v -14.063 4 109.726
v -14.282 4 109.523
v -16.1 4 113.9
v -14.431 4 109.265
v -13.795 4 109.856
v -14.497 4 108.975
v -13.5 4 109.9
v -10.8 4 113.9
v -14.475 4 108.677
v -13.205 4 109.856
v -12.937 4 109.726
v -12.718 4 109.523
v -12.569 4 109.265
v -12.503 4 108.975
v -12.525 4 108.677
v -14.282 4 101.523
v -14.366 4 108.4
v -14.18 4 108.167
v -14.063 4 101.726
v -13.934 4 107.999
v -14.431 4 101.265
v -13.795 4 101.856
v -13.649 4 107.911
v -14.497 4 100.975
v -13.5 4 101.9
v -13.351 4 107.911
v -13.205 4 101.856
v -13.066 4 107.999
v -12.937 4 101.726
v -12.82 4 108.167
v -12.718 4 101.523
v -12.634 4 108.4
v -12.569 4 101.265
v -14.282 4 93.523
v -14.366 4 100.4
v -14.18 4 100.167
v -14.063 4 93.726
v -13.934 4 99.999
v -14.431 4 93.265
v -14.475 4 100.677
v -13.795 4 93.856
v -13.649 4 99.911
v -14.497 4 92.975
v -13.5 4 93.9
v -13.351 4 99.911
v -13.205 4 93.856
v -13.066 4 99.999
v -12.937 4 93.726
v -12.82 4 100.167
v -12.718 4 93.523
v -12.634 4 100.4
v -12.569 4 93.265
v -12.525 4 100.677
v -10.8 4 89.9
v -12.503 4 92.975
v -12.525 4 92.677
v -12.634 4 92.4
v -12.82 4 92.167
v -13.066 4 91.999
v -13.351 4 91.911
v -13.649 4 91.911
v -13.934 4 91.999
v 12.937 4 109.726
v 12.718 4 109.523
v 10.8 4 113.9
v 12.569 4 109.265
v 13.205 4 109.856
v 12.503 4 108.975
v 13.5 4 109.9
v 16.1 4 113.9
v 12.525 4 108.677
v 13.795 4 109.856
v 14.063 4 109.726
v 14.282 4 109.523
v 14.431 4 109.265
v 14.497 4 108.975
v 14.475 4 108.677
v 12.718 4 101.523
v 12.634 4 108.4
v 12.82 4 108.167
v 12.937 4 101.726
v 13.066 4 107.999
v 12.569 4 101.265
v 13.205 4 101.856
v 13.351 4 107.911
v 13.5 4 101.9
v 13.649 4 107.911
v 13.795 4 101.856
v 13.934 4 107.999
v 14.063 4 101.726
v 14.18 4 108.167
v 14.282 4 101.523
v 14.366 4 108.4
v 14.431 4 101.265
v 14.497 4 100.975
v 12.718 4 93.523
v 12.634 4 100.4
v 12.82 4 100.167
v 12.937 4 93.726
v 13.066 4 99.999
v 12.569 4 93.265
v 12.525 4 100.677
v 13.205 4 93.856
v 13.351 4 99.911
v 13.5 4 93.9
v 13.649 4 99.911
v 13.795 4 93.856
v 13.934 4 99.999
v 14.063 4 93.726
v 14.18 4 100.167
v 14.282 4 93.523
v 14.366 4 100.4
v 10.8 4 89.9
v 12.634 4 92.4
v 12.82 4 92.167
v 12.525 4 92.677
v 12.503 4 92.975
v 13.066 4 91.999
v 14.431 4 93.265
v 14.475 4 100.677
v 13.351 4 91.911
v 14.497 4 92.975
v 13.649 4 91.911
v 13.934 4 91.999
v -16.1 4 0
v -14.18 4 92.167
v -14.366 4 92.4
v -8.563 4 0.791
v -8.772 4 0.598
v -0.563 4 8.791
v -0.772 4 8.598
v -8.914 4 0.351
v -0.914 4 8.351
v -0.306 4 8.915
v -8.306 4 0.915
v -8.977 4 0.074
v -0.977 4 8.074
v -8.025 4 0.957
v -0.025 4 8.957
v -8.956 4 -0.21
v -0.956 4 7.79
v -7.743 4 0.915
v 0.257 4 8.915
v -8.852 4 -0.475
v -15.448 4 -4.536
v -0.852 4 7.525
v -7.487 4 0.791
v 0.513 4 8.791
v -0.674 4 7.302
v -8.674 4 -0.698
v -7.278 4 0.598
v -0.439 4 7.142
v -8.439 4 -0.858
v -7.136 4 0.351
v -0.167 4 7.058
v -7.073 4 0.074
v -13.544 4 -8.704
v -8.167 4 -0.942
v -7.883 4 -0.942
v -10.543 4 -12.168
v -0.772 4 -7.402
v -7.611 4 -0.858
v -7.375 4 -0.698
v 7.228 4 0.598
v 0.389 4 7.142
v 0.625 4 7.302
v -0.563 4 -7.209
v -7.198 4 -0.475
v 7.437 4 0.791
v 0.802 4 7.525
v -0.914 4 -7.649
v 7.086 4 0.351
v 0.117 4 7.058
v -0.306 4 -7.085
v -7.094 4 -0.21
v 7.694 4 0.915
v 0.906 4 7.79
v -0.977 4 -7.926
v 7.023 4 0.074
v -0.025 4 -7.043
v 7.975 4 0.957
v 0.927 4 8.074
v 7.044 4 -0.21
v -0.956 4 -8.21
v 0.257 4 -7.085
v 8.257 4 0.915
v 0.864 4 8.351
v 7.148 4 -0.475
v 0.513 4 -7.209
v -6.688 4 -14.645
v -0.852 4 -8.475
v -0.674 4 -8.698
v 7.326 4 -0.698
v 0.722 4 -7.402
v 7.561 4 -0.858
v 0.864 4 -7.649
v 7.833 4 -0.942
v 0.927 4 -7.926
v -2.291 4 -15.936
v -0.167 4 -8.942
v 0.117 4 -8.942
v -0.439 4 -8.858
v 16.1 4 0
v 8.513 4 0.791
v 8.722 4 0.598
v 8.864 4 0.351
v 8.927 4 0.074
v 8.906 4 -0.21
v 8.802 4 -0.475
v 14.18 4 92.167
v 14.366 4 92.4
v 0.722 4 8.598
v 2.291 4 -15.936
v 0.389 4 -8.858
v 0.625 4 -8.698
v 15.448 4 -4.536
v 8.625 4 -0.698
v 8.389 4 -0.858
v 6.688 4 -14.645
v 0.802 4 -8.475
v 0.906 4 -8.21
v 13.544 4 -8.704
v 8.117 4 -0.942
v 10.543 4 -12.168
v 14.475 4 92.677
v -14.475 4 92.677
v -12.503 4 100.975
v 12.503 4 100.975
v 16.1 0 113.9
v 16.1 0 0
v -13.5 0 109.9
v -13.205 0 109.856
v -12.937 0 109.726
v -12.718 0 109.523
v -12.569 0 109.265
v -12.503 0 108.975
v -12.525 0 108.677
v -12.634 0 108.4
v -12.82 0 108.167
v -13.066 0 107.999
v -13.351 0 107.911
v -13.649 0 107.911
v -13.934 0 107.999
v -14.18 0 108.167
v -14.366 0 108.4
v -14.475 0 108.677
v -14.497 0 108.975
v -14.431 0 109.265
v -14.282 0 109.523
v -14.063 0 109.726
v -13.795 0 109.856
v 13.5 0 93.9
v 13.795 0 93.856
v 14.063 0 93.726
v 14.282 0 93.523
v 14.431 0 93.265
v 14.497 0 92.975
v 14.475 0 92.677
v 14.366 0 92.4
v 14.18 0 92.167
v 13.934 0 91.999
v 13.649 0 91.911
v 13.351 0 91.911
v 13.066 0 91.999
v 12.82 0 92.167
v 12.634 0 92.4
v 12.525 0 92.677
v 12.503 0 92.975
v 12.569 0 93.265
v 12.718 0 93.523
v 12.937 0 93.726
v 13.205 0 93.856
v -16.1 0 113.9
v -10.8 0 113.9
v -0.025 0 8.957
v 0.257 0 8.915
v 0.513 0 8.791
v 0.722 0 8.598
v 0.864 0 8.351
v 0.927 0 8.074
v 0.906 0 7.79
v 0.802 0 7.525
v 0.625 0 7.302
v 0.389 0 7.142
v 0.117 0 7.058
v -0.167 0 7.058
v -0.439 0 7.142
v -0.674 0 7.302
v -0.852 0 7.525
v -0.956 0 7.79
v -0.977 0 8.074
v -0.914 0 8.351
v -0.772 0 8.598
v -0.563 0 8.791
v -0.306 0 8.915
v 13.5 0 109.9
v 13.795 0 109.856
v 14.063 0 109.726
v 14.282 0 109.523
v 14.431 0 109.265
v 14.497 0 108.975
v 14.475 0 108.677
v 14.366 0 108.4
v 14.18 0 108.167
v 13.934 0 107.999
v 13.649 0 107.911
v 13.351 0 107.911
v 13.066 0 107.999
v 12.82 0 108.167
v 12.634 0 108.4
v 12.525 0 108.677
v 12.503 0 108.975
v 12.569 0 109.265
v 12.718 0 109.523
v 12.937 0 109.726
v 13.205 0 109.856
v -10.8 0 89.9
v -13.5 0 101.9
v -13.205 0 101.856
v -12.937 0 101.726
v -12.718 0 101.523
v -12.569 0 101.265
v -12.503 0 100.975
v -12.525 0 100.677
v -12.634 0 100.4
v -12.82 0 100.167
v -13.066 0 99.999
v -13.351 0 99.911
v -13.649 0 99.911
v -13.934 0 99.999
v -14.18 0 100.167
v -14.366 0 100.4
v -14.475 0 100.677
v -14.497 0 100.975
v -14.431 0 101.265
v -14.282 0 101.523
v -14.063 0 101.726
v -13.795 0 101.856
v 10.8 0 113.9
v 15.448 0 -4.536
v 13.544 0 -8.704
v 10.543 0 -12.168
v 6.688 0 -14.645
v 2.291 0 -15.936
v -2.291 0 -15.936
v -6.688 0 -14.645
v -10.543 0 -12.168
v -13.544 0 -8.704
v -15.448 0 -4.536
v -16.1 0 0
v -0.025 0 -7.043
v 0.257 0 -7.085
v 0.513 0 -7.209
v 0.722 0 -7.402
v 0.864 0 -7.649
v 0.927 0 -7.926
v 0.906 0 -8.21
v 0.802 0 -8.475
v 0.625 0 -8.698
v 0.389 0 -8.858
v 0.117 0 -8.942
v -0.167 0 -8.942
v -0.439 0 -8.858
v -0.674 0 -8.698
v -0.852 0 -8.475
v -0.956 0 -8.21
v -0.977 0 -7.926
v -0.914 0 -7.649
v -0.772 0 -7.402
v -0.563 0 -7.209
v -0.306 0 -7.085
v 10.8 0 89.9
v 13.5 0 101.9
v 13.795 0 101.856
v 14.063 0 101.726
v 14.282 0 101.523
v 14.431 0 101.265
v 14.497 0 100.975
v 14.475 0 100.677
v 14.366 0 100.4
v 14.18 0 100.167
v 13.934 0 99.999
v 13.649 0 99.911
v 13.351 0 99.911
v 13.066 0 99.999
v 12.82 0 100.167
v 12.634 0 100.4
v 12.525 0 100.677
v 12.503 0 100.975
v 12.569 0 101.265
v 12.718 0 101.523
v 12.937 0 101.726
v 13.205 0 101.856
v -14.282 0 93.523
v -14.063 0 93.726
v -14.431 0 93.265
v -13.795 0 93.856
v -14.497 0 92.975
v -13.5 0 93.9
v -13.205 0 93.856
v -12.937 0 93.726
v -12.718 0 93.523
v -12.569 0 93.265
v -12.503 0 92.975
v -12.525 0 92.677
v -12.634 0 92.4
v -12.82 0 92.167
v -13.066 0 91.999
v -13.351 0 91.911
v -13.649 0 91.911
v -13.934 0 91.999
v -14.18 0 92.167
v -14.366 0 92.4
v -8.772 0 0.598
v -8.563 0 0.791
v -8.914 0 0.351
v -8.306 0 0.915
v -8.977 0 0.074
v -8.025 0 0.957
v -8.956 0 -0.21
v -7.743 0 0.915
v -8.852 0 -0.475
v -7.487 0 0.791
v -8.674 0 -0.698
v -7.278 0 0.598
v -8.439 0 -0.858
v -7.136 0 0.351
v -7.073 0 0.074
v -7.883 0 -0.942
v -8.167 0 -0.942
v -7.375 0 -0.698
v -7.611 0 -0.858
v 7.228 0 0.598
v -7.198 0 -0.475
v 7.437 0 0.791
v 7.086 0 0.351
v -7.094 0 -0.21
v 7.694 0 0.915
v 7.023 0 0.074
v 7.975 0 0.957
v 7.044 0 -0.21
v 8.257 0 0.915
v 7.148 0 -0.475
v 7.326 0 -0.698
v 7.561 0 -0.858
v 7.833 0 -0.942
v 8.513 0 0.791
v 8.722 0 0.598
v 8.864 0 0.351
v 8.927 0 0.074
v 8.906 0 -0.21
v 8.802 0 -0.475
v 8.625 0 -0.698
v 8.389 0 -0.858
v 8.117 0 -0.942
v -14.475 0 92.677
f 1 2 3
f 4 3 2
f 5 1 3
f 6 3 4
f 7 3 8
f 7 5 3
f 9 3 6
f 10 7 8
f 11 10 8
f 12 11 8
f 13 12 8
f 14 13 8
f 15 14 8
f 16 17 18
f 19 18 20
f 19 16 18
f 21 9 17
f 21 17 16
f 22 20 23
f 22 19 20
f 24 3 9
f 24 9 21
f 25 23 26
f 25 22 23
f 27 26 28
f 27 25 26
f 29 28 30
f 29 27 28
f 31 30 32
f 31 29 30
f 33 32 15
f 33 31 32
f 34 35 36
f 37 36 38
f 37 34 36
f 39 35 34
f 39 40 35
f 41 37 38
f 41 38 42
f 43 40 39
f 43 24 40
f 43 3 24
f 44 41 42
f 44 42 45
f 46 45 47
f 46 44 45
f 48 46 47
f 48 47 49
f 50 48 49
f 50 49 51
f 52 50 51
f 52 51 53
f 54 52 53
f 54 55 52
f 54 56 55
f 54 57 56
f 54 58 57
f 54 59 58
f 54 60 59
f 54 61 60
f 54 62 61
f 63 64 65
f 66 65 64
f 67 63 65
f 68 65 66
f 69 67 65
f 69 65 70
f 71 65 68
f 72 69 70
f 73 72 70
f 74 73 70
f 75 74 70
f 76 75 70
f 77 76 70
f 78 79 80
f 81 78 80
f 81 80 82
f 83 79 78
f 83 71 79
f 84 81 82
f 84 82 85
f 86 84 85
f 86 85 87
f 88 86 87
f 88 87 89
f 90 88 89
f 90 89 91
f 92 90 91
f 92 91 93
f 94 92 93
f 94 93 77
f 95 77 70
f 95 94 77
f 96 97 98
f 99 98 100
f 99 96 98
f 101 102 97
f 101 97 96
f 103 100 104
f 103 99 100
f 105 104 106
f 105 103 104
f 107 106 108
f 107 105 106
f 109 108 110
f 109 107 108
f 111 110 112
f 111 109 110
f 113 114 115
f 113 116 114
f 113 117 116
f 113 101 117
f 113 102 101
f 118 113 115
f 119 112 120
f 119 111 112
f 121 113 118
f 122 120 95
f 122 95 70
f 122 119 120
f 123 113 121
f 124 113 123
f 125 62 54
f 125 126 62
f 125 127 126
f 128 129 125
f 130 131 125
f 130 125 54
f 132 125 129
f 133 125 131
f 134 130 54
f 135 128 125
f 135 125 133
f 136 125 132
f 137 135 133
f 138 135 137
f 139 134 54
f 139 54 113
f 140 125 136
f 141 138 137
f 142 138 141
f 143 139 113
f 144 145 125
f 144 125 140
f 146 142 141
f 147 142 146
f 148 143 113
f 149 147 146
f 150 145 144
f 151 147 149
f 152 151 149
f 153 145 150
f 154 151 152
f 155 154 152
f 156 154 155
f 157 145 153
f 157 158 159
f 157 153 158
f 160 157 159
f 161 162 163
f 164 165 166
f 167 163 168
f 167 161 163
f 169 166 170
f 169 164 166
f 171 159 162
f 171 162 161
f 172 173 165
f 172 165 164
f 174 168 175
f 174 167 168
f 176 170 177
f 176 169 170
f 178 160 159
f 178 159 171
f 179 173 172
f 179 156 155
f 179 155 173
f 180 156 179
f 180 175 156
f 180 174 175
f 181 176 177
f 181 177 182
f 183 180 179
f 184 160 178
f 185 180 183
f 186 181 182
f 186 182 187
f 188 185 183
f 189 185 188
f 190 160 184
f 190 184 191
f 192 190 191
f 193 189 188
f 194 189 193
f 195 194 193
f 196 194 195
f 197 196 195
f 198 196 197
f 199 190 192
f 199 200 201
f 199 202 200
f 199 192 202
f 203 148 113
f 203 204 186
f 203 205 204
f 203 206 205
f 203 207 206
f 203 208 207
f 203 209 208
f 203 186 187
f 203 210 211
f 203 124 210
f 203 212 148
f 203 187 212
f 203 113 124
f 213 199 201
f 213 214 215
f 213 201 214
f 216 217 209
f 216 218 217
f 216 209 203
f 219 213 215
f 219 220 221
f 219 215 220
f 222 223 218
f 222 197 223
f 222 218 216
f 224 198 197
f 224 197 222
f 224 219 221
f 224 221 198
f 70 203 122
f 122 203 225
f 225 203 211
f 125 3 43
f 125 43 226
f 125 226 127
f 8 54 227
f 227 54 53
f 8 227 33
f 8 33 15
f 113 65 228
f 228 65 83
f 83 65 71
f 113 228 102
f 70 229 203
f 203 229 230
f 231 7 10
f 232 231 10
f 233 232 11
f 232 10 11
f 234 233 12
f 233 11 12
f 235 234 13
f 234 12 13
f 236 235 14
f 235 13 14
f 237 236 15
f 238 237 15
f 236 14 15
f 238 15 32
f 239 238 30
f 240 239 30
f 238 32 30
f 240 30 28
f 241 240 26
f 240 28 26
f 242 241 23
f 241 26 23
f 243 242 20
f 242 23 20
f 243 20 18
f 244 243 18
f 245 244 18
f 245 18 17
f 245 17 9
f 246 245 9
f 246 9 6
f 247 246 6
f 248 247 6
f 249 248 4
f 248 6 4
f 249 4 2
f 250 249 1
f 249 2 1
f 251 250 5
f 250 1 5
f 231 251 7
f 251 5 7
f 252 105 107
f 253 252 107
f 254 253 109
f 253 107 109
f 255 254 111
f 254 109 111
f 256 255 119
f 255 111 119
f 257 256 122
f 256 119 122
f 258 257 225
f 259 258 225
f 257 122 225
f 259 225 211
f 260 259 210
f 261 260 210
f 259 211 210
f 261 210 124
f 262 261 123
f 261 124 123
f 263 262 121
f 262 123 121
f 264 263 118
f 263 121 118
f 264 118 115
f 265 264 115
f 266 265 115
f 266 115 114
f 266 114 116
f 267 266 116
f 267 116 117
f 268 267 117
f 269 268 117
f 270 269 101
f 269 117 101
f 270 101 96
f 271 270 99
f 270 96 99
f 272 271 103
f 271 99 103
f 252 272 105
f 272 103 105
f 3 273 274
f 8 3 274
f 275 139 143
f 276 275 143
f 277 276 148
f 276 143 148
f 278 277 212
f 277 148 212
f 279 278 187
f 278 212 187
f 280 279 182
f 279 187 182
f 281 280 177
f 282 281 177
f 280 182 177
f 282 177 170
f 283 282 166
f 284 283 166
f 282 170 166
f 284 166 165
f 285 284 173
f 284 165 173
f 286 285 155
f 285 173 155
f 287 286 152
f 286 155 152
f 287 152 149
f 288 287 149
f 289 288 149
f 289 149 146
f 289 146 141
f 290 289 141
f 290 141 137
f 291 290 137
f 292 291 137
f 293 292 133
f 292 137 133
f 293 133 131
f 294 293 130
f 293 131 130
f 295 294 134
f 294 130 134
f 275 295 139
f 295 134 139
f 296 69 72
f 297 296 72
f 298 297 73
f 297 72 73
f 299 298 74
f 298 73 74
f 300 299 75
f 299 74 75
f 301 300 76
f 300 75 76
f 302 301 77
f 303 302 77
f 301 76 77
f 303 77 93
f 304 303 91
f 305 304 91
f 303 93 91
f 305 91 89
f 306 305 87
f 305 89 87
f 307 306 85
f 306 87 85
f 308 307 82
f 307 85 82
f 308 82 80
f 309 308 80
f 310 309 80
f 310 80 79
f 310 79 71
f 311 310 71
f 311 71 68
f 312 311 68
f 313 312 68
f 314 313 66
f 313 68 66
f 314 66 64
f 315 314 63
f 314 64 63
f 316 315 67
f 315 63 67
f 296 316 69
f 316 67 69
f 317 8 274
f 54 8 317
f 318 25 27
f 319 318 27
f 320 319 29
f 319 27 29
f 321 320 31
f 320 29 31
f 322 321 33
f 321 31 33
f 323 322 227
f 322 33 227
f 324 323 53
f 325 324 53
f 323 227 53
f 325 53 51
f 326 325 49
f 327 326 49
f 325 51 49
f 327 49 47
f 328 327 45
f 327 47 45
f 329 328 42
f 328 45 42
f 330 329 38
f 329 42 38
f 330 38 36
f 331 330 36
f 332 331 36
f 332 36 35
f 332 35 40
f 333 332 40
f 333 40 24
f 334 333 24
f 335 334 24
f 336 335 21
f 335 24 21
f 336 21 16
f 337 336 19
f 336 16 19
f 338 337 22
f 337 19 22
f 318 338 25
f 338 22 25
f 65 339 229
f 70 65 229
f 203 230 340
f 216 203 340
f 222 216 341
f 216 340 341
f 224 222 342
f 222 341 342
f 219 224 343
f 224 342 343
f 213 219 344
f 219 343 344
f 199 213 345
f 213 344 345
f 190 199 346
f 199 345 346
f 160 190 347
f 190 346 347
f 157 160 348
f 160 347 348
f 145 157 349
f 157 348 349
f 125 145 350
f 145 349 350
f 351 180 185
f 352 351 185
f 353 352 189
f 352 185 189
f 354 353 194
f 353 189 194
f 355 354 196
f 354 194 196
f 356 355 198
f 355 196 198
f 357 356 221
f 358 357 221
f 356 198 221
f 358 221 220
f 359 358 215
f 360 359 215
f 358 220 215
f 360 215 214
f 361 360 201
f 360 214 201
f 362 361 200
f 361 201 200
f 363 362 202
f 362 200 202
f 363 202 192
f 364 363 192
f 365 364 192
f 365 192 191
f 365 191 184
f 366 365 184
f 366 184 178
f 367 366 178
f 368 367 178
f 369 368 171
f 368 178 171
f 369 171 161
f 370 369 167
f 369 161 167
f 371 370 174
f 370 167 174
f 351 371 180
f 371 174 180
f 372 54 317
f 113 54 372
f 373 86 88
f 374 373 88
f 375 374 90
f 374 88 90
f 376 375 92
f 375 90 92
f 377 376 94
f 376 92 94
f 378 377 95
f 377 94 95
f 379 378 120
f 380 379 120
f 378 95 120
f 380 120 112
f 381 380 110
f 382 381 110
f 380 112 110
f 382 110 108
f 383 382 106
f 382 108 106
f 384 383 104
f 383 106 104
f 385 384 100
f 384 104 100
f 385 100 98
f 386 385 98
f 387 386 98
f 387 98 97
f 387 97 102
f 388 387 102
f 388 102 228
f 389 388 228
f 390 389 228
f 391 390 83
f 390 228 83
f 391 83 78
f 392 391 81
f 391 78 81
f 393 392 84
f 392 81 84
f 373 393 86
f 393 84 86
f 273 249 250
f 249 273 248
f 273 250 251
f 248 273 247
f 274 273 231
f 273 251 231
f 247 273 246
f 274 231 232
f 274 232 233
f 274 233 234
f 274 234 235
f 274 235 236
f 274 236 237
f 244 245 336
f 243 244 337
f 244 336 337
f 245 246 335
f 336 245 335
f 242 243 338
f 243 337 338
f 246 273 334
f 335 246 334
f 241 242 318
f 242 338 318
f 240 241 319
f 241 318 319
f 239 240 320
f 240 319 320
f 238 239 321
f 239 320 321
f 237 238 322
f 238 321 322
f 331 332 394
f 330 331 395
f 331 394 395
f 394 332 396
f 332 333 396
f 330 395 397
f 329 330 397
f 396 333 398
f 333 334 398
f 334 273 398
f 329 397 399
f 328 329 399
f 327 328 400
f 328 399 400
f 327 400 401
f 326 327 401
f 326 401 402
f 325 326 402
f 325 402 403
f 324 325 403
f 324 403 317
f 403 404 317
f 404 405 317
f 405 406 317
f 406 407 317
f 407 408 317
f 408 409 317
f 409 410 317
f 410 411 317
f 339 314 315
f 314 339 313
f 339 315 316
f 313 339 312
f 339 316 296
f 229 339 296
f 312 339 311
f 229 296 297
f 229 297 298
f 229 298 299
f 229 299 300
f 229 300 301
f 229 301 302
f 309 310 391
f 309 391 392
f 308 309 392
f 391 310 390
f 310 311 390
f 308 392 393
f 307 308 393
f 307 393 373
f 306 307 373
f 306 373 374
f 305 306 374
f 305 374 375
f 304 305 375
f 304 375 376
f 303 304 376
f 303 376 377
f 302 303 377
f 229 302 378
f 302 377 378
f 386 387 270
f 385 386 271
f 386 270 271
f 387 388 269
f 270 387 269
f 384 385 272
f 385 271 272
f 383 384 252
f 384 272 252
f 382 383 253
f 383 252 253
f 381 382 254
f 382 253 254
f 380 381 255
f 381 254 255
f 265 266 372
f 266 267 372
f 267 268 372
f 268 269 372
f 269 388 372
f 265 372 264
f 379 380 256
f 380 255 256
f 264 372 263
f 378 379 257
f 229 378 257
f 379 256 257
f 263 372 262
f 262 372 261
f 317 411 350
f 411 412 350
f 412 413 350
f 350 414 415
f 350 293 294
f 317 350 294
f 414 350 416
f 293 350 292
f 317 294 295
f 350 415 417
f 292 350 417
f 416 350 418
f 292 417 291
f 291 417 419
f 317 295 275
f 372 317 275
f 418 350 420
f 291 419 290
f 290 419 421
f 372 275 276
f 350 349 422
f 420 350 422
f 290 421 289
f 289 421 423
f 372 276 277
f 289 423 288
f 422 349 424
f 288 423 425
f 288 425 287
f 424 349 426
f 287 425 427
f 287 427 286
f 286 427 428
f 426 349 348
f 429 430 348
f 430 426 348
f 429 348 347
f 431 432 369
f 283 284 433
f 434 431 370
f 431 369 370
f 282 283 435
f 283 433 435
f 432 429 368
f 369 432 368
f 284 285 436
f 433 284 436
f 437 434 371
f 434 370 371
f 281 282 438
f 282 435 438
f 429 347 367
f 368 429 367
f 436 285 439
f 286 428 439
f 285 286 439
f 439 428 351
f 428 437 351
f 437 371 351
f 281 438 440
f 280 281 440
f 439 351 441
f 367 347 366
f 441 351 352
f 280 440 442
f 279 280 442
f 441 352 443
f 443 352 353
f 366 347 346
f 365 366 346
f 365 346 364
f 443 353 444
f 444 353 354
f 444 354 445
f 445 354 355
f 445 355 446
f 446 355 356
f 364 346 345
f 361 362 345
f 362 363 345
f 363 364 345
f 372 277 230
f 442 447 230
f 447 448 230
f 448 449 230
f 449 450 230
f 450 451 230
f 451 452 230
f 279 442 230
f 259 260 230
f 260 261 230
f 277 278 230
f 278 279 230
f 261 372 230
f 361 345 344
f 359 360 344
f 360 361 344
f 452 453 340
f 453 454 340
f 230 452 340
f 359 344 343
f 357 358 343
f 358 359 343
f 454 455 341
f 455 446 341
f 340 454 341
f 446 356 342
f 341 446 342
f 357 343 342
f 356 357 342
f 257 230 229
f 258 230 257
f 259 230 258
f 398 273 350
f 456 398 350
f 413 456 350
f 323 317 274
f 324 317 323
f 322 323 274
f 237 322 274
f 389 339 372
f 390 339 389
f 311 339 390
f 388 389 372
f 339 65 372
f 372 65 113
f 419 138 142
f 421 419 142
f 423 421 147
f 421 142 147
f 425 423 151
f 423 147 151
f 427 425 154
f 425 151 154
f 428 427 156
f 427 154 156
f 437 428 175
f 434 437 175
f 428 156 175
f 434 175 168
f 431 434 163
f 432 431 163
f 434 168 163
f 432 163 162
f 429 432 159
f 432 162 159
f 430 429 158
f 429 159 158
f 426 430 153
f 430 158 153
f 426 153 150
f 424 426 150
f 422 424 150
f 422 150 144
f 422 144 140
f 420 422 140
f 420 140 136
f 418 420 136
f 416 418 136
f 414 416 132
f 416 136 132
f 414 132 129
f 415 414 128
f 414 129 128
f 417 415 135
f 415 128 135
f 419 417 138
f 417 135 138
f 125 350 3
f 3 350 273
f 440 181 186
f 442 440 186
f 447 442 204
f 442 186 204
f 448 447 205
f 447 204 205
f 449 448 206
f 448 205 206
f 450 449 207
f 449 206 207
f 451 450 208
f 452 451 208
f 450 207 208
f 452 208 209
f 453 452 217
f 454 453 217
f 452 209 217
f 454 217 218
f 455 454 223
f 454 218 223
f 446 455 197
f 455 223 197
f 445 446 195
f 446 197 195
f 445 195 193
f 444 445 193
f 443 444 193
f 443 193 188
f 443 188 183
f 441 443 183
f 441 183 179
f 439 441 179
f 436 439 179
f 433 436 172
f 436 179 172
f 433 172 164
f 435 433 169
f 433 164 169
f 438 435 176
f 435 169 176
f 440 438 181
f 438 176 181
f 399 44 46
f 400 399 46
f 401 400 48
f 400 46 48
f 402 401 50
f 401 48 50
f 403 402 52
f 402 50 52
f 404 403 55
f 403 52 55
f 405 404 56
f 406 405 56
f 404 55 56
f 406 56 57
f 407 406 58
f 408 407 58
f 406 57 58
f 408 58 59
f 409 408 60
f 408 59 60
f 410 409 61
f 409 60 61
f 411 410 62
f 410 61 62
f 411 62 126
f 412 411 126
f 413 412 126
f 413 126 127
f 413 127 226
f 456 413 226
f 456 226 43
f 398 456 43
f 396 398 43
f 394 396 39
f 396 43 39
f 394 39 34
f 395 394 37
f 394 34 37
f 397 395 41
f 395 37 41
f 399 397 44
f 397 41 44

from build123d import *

# Parameters (mm, degrees)
BOSS_EXTRU_1_DEPTH      = 4
ESQUISSE2_R             = 0.955
ESQUISSE2_R_2           = 1
ENL_V_MAT_EXTRU_1_DEPTH = 4
ESQUISSE4_W             = 18
ESQUISSE4_H             = 24
ENL_V_MAT_EXTRU_2_DEPTH = 10
ESQUISSE5_W             = 2.116024011
ESQUISSE5_H             = 24
ESQUISSE5_W_2           = 1.483975989
ENL_V_MAT_EXTRU_3_DEPTH = 10


with BuildPart() as part:
    # Esquisse1 → Boss.-Extru.1 (new body)
    with BuildSketch(Plane(origin=(0, 0, 0), x_dir=(1, 0, 0), z_dir=(0, 1, 0))):
        with BuildLine():
            Line((-16.1, 0), (-16.1, -113.9))
            Line((-16.1, -113.9), (16.1, -113.9))
            Line((16.1, -113.9), (16.1, 0))
            ThreePointArc((16.1, 0), (0, 16.1), (-16.1, 0))
        make_face()
    extrude(amount=BOSS_EXTRU_1_DEPTH)

    # Esquisse2 → Enlèv. mat.-Extru.1 (cut)
    with BuildSketch(Plane(origin=(0, 4, 0), x_dir=(1, 0, 0), z_dir=(0, 1, 0))):
        with Locations(Location((7.975097556, -0.002271435, 0), (0, 0, 270))):
            Circle(ESQUISSE2_R)
        with Locations(Location((-8.024902444, -0.002271435, 0), (0, 0, 270))):
            Circle(ESQUISSE2_R)
        with Locations(Location((-0.024902444, -8.002271435, 0), (0, 0, 270))):
            Circle(ESQUISSE2_R)
        with Locations(Location((-0.024902444, 7.997728565, 0), (0, 0, 270))):
            Circle(ESQUISSE2_R)
        with Locations(Location((-13.5, -108.9, 0), (0, 0, 270))):
            Circle(ESQUISSE2_R_2)
        with Locations(Location((13.5, -108.9, 0), (0, 0, 270))):
            Circle(ESQUISSE2_R_2)
        with Locations(Location((-13.5, -100.9, 0), (0, 0, 270))):
            Circle(ESQUISSE2_R_2)
        with Locations(Location((13.5, -100.9, 0), (0, 0, 270))):
            Circle(ESQUISSE2_R_2)
        with Locations(Location((-13.5, -92.9, 0), (0, 0, 270))):
            Circle(ESQUISSE2_R_2)
        with Locations(Location((13.5, -92.9, 0), (0, 0, 270))):
            Circle(ESQUISSE2_R_2)
    extrude(amount=-ENL_V_MAT_EXTRU_1_DEPTH, mode=Mode.SUBTRACT)

    # Esquisse4 → Enlèv. mat.-Extru.2 (cut)
    with BuildSketch(Plane(origin=(0, 4, 0), x_dir=(1, 0, 0), z_dir=(0, 1, 0))):
        with Locations((0.316024011, -101.9)):
            Rectangle(ESQUISSE4_W, ESQUISSE4_H)
    extrude(amount=-ENL_V_MAT_EXTRU_2_DEPTH, mode=Mode.SUBTRACT)

    # Esquisse5 → Enlèv. mat.-Extru.3 (cut)
    with BuildSketch(Plane(origin=(0, 4, 0), x_dir=(1, 0, 0), z_dir=(0, 1, 0))):
        with Locations((-9.741987995, -101.9)):
            Rectangle(ESQUISSE5_W, ESQUISSE5_H)
        with Locations((10.058012006, -101.9)):
            Rectangle(ESQUISSE5_W_2, ESQUISSE5_H)
    extrude(amount=-ENL_V_MAT_EXTRU_3_DEPTH, mode=Mode.SUBTRACT)


solid = part.part
